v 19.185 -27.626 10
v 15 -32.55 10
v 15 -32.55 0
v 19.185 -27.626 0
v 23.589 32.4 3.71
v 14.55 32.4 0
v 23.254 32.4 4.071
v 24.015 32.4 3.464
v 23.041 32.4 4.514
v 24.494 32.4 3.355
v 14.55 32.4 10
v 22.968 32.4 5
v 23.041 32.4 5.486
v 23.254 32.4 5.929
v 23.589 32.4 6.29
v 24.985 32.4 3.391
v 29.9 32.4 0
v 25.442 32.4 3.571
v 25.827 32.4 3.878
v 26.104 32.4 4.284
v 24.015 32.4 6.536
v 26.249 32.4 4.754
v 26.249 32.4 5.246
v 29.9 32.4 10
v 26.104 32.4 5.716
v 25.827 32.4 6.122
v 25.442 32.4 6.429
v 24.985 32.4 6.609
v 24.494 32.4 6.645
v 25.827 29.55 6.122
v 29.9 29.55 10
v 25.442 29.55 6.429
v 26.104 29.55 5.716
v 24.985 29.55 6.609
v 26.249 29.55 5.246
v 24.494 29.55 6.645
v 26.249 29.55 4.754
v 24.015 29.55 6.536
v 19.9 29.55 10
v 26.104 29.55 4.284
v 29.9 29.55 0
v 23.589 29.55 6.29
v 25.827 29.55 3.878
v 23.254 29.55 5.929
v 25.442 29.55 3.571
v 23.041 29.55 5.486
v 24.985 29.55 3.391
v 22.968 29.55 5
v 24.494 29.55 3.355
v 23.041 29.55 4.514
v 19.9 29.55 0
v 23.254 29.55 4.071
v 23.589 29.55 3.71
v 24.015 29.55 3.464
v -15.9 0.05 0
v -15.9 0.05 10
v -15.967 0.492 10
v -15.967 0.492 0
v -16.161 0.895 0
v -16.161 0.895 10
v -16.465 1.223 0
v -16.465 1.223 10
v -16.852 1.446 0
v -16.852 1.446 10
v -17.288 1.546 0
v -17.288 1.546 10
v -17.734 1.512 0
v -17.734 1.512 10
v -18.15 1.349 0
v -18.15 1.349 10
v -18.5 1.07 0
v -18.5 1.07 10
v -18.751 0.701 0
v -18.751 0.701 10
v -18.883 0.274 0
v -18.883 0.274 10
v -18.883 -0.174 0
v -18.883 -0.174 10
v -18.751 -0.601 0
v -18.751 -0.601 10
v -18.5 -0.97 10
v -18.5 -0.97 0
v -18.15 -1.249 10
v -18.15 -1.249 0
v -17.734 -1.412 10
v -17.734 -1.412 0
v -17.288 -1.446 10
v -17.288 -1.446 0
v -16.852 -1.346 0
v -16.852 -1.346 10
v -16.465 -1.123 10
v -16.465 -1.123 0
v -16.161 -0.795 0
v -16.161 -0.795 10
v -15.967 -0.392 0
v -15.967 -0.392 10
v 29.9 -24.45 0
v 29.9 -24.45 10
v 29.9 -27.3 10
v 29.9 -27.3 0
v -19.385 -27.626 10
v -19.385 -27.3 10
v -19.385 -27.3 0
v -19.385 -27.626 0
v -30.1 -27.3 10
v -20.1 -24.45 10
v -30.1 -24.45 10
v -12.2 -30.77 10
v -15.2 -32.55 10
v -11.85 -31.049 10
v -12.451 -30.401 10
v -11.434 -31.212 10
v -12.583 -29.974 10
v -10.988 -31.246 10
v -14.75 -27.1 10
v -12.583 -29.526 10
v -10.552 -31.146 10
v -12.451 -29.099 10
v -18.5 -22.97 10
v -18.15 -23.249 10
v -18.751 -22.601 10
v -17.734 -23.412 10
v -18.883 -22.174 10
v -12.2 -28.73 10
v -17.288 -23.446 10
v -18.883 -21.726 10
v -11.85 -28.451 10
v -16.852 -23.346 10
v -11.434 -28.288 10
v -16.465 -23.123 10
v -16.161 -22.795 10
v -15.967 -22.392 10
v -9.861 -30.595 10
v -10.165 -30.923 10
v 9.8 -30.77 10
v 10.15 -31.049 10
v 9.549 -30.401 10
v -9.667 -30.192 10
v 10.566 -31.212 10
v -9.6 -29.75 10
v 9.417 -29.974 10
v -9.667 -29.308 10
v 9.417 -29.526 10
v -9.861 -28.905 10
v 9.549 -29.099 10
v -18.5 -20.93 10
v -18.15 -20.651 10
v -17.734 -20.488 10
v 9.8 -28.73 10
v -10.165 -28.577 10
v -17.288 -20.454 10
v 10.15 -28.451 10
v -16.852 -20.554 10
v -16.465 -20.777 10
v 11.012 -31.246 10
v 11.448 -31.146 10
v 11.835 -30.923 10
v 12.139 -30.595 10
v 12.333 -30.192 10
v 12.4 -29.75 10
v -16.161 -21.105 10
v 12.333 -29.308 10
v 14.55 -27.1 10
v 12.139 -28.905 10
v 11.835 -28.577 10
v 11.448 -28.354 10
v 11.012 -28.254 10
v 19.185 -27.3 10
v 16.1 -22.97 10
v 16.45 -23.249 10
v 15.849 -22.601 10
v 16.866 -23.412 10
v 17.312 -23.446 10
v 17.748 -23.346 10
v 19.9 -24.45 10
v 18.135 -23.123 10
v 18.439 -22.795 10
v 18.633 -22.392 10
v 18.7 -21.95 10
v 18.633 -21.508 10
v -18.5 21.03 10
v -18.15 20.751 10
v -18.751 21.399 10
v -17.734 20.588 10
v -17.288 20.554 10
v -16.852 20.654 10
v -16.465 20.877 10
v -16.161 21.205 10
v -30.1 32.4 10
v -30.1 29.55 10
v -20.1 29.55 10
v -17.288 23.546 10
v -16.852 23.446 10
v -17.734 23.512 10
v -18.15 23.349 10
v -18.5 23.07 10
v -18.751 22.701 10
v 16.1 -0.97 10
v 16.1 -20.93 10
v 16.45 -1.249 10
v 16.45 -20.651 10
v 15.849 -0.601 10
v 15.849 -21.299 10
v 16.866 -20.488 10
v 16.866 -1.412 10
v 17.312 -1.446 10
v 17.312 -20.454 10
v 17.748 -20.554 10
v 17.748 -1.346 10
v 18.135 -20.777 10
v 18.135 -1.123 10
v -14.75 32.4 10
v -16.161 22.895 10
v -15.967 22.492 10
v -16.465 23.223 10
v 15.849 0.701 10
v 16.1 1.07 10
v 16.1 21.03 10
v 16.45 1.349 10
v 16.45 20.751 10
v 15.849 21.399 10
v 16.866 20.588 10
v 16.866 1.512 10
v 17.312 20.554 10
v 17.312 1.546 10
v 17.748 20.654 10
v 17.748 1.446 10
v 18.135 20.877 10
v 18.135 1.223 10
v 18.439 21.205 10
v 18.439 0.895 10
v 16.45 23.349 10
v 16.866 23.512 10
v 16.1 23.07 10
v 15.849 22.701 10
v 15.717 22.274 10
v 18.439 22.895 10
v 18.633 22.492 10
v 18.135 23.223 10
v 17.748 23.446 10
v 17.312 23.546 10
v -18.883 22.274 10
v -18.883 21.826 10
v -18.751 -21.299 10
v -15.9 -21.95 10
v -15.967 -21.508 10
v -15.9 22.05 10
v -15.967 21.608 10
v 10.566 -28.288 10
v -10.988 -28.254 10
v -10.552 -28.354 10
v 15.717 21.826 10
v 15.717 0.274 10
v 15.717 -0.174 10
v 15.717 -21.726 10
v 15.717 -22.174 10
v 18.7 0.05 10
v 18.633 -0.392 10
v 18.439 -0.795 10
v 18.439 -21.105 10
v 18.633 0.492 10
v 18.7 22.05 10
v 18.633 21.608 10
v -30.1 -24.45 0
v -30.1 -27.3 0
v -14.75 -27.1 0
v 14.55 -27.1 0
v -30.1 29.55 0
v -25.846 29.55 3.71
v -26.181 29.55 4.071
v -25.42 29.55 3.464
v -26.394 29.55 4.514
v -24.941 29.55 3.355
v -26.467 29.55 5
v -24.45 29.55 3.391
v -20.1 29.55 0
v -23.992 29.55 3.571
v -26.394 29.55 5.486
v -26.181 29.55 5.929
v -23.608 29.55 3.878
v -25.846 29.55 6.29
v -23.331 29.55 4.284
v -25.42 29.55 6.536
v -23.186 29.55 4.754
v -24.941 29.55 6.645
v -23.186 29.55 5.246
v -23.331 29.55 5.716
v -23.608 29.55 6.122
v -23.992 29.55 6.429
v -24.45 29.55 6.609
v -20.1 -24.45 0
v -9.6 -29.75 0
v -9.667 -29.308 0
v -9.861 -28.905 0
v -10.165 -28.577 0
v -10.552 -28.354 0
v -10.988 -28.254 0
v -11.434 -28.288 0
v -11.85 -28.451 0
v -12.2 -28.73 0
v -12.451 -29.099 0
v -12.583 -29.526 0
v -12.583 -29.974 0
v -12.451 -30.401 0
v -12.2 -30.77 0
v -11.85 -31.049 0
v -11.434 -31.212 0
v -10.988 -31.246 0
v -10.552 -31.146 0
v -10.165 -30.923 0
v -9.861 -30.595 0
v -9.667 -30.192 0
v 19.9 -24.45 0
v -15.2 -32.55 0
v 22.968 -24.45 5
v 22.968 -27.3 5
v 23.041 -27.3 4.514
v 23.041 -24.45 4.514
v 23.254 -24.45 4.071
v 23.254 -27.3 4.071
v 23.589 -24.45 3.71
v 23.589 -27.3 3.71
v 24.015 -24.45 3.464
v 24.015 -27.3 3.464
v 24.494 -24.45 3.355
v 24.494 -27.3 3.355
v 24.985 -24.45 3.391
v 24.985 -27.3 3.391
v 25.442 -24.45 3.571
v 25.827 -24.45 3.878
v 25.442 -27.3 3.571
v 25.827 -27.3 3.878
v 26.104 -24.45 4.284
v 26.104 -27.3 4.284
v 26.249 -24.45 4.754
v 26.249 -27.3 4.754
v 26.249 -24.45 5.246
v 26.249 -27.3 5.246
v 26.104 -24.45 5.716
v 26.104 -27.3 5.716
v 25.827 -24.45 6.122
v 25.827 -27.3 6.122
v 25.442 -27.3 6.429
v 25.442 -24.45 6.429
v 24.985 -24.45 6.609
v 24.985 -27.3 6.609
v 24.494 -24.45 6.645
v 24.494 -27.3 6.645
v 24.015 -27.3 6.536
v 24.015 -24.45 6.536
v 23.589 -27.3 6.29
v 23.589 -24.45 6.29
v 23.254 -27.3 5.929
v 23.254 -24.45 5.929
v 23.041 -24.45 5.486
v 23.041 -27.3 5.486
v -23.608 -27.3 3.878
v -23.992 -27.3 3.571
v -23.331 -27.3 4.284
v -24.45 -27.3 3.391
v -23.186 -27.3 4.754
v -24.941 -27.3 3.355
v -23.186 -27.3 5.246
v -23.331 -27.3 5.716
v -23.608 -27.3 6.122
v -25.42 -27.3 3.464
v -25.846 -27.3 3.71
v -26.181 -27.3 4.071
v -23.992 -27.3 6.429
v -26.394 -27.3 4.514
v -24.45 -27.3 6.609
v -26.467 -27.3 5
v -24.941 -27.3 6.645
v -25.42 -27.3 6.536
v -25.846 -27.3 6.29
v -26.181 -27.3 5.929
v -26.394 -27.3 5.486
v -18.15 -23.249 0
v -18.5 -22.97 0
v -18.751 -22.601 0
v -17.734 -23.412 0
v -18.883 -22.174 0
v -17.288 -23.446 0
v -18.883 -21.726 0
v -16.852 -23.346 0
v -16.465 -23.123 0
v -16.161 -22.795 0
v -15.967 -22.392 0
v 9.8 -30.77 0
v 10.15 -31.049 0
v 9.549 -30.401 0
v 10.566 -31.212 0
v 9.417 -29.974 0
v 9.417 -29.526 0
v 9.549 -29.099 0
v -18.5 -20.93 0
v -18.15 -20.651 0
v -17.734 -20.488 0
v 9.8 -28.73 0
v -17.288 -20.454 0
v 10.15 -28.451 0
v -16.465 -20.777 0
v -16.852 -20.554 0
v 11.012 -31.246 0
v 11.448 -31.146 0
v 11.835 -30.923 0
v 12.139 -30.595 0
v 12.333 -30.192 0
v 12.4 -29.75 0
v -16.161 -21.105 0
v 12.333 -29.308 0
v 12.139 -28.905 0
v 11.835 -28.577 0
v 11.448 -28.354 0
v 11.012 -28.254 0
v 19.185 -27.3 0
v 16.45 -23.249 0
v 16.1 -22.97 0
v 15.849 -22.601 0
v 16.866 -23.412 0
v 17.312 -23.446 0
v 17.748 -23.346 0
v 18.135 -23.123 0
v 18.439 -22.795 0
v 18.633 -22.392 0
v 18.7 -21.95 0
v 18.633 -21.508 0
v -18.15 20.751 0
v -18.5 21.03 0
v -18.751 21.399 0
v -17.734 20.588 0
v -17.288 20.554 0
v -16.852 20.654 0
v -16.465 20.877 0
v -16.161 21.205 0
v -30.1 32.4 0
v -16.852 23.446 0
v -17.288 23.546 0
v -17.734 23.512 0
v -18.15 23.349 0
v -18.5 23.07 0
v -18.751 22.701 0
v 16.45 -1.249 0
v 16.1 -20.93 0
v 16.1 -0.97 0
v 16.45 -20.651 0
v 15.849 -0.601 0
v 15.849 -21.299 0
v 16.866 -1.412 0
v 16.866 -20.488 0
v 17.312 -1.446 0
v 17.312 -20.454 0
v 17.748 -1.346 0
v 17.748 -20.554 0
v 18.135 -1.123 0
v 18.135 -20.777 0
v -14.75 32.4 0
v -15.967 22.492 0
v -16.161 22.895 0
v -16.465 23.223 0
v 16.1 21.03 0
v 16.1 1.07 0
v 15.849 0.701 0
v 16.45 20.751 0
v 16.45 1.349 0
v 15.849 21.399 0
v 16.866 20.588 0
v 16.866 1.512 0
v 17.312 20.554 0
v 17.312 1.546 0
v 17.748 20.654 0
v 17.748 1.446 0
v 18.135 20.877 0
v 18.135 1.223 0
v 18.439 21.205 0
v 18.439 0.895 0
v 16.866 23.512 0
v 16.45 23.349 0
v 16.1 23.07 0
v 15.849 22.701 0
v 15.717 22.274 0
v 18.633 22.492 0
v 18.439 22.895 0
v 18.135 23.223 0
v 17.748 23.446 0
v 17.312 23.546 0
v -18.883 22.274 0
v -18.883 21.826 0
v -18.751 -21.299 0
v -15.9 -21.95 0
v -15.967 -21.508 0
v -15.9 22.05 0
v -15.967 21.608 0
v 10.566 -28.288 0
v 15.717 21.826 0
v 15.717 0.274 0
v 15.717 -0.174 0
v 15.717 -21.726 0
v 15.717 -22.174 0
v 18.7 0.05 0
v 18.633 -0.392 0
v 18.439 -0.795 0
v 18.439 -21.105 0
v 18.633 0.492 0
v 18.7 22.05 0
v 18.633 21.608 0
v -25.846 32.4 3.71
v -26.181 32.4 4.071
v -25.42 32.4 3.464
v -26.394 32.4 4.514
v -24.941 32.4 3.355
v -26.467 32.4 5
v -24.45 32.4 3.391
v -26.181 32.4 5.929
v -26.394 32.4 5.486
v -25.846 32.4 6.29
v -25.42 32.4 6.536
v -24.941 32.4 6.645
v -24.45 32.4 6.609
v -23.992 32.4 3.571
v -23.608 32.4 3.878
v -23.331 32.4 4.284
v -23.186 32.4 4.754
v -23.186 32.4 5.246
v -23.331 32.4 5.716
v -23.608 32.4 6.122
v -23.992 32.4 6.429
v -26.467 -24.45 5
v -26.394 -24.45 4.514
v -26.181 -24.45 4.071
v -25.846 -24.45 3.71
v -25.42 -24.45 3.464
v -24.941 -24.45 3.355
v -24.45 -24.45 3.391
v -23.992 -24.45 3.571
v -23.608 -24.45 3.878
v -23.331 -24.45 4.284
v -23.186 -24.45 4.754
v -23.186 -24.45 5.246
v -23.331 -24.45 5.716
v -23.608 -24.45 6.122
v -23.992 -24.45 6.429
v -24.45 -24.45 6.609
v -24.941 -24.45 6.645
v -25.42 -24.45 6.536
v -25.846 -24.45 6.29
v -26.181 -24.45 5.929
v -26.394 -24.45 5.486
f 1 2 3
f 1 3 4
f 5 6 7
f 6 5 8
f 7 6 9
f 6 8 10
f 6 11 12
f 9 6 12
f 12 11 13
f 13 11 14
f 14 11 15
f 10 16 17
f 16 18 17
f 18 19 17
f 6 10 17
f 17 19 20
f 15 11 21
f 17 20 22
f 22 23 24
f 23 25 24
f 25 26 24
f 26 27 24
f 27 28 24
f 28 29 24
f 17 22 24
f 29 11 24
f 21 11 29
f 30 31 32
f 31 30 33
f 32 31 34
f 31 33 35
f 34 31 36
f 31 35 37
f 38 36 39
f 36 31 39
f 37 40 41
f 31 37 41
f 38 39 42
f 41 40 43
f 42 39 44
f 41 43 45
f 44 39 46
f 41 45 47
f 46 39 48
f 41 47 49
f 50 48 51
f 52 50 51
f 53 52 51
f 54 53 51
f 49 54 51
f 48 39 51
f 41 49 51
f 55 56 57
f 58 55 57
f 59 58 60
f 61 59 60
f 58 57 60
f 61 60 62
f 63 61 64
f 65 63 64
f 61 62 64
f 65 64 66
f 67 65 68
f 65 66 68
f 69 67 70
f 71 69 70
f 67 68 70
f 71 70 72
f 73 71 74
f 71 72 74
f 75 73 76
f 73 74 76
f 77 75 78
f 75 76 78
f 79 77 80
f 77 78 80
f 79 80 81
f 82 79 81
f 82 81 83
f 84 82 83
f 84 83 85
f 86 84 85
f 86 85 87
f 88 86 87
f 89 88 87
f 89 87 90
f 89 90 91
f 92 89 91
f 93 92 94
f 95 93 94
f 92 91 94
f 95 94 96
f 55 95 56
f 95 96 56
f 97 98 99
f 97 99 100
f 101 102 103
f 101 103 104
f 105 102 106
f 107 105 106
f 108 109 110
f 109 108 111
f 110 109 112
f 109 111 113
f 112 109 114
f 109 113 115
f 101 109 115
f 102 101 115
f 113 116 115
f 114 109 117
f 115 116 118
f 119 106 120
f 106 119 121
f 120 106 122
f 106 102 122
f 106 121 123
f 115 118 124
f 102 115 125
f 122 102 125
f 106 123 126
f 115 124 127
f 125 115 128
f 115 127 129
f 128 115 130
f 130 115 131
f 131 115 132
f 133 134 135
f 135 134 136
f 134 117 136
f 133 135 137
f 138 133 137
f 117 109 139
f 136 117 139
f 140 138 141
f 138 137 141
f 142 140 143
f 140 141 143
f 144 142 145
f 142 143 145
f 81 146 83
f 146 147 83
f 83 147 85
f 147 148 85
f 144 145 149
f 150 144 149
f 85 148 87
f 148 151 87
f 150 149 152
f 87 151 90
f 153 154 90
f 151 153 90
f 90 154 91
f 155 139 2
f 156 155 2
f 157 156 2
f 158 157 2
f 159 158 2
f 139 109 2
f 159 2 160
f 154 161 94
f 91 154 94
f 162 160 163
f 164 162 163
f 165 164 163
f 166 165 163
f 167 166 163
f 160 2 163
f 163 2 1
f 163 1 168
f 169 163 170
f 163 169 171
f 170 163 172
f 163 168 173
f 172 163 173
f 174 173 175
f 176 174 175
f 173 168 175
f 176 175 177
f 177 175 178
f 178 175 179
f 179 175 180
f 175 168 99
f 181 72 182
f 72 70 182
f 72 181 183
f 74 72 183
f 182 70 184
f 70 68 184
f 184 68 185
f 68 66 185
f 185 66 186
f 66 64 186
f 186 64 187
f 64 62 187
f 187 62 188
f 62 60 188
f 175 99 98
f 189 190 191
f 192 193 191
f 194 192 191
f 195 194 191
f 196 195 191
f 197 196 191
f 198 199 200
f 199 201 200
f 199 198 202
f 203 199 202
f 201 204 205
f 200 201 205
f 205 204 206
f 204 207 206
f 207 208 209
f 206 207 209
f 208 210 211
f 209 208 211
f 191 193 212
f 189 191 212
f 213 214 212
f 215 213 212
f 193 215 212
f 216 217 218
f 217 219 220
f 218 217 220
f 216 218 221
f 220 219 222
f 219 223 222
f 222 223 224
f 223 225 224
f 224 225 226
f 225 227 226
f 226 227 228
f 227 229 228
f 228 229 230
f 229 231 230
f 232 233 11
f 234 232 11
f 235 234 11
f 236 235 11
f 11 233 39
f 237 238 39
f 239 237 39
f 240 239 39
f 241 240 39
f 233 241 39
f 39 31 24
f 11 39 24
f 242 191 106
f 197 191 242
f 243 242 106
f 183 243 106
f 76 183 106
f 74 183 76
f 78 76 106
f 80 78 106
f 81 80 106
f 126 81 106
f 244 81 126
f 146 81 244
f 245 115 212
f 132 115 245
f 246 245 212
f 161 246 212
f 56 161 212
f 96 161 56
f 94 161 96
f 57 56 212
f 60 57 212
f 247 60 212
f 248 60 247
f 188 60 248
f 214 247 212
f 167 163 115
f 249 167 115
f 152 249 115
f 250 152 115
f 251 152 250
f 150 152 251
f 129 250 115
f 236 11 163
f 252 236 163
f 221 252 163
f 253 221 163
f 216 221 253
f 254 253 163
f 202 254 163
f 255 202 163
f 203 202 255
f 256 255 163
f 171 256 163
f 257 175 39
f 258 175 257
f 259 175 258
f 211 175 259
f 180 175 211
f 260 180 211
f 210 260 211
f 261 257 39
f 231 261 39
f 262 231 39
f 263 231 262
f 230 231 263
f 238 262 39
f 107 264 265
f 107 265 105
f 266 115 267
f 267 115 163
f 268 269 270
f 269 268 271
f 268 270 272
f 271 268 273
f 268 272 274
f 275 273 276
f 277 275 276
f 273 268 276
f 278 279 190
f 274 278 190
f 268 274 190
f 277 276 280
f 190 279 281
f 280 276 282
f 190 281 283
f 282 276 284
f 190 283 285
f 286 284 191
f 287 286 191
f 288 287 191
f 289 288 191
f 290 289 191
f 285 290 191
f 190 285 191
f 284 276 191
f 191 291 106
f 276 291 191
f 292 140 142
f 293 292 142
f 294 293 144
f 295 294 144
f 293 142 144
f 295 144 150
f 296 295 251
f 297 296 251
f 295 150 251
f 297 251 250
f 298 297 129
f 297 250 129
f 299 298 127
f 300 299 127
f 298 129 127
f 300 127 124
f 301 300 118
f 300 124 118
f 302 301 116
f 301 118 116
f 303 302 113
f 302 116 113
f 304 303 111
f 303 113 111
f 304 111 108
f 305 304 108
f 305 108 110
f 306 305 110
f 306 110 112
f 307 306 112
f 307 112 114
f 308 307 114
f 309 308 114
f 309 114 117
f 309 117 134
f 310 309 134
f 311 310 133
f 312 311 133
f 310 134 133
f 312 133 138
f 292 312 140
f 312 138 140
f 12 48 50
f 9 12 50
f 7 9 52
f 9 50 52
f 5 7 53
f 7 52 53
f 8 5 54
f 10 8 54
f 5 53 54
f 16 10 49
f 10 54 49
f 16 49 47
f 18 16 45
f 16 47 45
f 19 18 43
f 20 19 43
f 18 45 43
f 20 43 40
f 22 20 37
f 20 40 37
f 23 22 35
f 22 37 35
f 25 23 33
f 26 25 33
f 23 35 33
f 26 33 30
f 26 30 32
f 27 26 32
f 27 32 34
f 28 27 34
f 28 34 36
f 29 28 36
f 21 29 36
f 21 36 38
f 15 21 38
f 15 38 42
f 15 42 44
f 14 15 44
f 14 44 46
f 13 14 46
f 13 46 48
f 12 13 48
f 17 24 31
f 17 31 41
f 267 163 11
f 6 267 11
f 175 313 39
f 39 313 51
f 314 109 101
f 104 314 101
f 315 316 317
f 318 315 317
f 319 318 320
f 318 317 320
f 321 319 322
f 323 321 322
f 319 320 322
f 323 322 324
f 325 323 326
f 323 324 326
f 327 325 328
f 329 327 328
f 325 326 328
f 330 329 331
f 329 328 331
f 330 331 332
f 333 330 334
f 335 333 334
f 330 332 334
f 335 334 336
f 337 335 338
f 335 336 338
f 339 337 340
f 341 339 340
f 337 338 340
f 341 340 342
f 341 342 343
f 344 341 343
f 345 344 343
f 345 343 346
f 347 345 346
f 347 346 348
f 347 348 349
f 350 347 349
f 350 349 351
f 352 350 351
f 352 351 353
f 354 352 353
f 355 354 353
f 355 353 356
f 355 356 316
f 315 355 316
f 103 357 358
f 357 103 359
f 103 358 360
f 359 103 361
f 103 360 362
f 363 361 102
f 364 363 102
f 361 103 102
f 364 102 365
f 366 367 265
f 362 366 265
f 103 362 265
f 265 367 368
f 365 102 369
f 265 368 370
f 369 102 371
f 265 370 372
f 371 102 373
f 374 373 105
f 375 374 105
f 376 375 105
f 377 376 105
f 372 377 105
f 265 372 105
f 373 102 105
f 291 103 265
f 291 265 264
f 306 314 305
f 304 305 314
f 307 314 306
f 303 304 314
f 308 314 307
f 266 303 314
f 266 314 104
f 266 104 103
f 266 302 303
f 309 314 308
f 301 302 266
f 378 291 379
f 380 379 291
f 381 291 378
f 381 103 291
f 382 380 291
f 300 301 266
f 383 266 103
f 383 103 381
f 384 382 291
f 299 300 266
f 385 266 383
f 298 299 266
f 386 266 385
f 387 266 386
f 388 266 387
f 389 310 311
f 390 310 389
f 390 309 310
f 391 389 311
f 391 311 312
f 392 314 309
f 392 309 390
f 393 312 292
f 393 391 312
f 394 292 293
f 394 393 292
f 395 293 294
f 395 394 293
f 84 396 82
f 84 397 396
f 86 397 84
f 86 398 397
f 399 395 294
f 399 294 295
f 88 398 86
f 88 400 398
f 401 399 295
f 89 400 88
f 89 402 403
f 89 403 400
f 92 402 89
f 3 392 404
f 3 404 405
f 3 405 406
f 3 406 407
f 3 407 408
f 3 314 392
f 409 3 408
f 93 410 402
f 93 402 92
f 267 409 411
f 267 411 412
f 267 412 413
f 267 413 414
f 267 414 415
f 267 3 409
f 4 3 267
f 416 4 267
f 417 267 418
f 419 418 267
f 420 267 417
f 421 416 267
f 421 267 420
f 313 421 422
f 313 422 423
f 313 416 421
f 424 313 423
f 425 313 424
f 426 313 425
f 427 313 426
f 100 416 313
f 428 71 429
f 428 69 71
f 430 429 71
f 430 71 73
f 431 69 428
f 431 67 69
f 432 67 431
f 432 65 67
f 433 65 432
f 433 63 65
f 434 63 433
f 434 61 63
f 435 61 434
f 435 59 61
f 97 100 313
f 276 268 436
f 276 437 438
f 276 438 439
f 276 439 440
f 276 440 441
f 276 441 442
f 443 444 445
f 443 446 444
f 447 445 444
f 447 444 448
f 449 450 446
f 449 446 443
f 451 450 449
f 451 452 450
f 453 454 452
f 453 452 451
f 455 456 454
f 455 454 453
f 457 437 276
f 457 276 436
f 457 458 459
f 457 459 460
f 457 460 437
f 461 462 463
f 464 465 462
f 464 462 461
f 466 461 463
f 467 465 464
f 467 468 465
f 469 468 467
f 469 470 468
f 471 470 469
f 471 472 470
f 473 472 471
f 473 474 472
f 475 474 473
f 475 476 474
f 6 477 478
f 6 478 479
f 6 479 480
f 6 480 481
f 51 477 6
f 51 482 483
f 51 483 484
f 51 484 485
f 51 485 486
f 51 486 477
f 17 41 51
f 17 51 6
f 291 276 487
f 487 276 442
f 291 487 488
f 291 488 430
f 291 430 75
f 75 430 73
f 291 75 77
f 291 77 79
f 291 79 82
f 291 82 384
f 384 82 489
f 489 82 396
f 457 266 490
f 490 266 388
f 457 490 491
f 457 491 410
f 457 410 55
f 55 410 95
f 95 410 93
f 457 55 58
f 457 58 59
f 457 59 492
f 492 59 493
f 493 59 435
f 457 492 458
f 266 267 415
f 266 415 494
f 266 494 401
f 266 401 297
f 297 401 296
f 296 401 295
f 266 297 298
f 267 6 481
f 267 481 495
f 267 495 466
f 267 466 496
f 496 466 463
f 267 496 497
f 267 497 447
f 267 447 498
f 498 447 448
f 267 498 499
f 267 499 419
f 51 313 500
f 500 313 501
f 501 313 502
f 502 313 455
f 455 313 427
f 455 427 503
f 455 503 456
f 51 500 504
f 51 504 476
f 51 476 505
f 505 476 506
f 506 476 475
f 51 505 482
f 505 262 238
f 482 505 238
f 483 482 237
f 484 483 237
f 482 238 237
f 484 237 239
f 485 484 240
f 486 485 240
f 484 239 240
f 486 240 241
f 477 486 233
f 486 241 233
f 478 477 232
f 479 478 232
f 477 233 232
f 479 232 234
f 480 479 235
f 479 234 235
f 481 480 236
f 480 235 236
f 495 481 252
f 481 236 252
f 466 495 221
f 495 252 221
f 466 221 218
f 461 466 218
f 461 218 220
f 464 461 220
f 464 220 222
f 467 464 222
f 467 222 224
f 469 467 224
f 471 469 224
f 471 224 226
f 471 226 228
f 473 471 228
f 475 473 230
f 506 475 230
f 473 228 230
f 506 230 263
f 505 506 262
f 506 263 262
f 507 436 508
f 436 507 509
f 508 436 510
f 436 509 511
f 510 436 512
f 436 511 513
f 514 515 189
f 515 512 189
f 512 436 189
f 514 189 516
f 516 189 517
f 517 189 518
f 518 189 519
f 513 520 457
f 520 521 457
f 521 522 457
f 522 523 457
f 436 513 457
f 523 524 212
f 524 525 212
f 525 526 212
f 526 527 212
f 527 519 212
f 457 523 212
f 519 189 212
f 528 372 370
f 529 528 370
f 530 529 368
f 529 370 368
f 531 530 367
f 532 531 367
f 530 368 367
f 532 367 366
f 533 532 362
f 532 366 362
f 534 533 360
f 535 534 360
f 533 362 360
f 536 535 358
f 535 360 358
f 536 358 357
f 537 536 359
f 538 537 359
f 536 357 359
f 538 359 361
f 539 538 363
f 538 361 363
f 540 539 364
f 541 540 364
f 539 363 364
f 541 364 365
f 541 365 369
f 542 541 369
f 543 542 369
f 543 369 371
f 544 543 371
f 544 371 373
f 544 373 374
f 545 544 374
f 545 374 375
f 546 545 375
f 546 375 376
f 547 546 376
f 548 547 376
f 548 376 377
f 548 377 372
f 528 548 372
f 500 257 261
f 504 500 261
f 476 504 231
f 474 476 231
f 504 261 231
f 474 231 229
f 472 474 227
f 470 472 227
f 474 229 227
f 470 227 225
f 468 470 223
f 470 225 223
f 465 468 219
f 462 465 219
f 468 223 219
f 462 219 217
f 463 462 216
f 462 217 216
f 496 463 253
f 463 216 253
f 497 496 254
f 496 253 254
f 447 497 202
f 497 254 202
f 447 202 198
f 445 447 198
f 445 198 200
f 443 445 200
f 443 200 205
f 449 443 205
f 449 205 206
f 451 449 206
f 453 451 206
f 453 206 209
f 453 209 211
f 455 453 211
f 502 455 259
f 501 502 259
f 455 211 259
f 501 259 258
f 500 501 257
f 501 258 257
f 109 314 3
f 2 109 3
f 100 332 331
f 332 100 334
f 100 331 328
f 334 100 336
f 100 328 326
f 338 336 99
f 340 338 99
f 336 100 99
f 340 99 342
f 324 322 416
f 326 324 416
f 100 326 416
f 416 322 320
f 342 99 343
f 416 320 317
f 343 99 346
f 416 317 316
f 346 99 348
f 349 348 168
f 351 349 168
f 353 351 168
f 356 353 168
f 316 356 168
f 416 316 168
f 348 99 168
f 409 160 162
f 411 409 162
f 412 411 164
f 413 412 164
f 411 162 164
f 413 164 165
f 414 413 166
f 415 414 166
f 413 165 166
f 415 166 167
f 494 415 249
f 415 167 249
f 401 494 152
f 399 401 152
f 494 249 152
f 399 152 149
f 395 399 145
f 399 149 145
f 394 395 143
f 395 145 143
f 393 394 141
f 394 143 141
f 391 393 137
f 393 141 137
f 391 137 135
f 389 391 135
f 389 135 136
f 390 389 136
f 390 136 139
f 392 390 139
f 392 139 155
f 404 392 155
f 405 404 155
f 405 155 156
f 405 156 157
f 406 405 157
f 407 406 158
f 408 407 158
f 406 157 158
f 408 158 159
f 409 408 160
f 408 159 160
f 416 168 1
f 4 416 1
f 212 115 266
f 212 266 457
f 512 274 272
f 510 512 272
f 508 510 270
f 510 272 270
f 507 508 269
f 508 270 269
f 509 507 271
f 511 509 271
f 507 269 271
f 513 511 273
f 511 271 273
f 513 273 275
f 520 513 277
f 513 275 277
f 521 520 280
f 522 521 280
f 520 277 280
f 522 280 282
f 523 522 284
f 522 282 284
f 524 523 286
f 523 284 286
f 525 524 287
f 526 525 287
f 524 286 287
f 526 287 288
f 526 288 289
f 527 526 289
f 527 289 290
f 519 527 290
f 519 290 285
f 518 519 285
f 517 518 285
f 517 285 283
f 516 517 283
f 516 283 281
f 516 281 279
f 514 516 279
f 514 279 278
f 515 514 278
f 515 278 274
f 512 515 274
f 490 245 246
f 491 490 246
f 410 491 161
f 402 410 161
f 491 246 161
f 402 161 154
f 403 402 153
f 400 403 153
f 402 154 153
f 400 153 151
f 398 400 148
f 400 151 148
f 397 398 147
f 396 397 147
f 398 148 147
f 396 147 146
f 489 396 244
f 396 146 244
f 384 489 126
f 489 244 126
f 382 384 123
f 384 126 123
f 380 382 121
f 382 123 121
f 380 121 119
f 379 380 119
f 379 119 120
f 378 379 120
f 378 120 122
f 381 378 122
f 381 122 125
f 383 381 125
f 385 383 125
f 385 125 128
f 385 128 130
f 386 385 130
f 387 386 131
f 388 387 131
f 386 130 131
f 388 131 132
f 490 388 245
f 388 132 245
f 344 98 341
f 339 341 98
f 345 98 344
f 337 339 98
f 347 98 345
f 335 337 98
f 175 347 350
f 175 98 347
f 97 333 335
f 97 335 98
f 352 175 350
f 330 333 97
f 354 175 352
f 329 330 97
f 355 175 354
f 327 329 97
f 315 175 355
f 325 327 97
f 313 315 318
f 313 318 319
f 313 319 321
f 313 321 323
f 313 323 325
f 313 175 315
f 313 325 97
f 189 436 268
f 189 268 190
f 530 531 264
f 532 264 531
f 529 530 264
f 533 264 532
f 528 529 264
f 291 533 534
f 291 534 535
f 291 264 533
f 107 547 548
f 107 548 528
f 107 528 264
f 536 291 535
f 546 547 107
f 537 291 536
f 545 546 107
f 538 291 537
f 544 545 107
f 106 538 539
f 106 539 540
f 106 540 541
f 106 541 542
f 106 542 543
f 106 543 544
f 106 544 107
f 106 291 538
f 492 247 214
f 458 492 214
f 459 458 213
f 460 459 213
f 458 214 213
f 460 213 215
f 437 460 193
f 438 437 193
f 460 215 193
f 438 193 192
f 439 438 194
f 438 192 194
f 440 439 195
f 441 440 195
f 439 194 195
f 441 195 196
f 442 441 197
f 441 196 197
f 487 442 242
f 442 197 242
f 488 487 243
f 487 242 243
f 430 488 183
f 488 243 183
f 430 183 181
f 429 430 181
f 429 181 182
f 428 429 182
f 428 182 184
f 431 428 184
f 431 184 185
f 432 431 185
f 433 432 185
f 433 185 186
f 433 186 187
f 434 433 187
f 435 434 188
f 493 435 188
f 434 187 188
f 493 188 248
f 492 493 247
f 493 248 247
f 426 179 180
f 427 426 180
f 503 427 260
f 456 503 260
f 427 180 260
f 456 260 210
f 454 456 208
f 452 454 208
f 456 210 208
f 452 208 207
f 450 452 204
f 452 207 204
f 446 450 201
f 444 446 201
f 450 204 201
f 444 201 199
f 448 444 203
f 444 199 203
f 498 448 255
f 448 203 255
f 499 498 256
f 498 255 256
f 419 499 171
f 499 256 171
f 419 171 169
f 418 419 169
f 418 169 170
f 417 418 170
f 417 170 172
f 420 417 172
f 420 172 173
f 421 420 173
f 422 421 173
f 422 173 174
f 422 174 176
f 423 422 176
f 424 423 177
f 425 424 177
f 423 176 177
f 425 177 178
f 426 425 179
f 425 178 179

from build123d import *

# Parameters (mm, degrees)
SKETCH1_W               = 40
SKETCH1_H               = 65.1
BOSS_EXTRUDE1_DEPTH     = 10
CUT_EXTRUDE1_DEPTH      = 10
SKETCH4_W               = 29.3
SKETCH4_H               = 59.5
CUT_EXTRUDE2_DEPTH      = 10
SKETCH5_R               = 1.5
CUT_EXTRUDE3_DEPTH      = 10
SKETCH7_W               = 10
SKETCH7_H               = 3
BOSS_EXTRUDE2_DEPTH     = 10
SKETCH8_W               = 10
SKETCH8_H               = 3
BOSS_EXTRUDE3_DEPTH     = 10
SKETCH9_R               = 1.65
CUT_EXTRUDE4_DEPTH      = 61
SKETCH10_R              = 1.65
CUT_EXTRUDE5_DEPTH      = 61
ESQUISSE1_W             = 15.35
ESQUISSE1_H             = 0.15
ESQUISSE1_W_2           = 29.3
ENL_V_MAT_EXTRU_1_DEPTH = 11


with BuildPart() as part:
    # Sketch1 → Boss-Extrude1 (new body)
    with BuildSketch(Plane.XY):
        with Locations((-0.1, 0)):
            Rectangle(SKETCH1_W, SKETCH1_H)
    extrude(amount=BOSS_EXTRUDE1_DEPTH)

    # Sketch2 → Cut-Extrude1 (cut)
    with BuildSketch(Plane.XY.offset(10)):
        Polygon((15, -32.55), (19.335, -27.45), (19.9, -27.45), (19.9, -32.55), align=None)
        Polygon((-20.1, -27.45), (-20.1, -32.55), (-15.2, -32.55), (-19.535, -27.45), align=None)
    extrude(amount=-CUT_EXTRUDE1_DEPTH, mode=Mode.SUBTRACT)

    # Sketch4 → Cut-Extrude2 (cut)
    with BuildSketch(Plane.XY.offset(10)):
        with Locations((-0.1, 2.8)):
            Rectangle(SKETCH4_W, SKETCH4_H)
    extrude(amount=-CUT_EXTRUDE2_DEPTH, mode=Mode.SUBTRACT)

    # Sketch5 → Cut-Extrude3 (cut)
    with BuildSketch(Plane.XY.offset(10)):
        with Locations((-17.4, 22.05)):
            Circle(SKETCH5_R)
        with Locations((-17.4, 0.05)):
            Circle(SKETCH5_R)
        with Locations((-17.4, -21.95)):
            Circle(SKETCH5_R)
        with Locations((-11.1, -29.75)):
            Circle(SKETCH5_R)
        with Locations((10.9, -29.75)):
            Circle(SKETCH5_R)
        with Locations((17.2, -21.95)):
            Circle(SKETCH5_R)
        with Locations((17.2, 0.05)):
            Circle(SKETCH5_R)
        with Locations((17.2, 22.05)):
            Circle(SKETCH5_R)
    extrude(amount=-CUT_EXTRUDE3_DEPTH, mode=Mode.SUBTRACT)

    # Sketch7 → Boss-Extrude2 (add)
    with BuildSketch(Plane(origin=(19.9, 0, 0), x_dir=(0, 0, -1), z_dir=(1, 0, 0))):
        with Locations((-5, 31.05)):
            Rectangle(SKETCH7_W, SKETCH7_H)
        with Locations((-5, -25.95)):
            Rectangle(SKETCH7_W, SKETCH7_H)
    extrude(amount=BOSS_EXTRUDE2_DEPTH)

    # Sketch8 → Boss-Extrude3 (add)
    with BuildSketch(Plane.ZY.offset(20.1)):
        with Locations((5, 31.05)):
            Rectangle(SKETCH8_W, SKETCH8_H)
        with Locations((5, -25.95)):
            Rectangle(SKETCH8_W, SKETCH8_H)
    extrude(amount=BOSS_EXTRUDE3_DEPTH)

    # Sketch9 → Cut-Extrude4 (cut, through all)
    with BuildSketch(Plane(origin=(0, -27.45, 0), x_dir=(-1, 0, 0), z_dir=(0, -1, 0))):
        with Locations((24.8175, -5)):
            Circle(SKETCH9_R)
    extrude(amount=-CUT_EXTRUDE4_DEPTH, mode=Mode.SUBTRACT)

    # Sketch10 → Cut-Extrude5 (cut, through all)
    with BuildSketch(Plane(origin=(0, -27.45, 0), x_dir=(-1, 0, 0), z_dir=(0, -1, 0))):
        with Locations((-24.6175, -5)):
            Circle(SKETCH10_R)
    extrude(amount=-CUT_EXTRUDE5_DEPTH, mode=Mode.SUBTRACT)

    # Esquisse1 → Enlèv. mat.-Extru.1 (cut, through all)
    with BuildSketch(Plane.XY.offset(10)):
        Polygon((29.9, -27.45), (29.9, -27.3), (19.335, -27.3), (19.185, -27.3), (19.185, -27.905597112), (27.185, -27.905597112), (27.185, -27.45), align=None)
        with Locations((22.225, 32.475)):
            Rectangle(ESQUISSE1_W, ESQUISSE1_H)
        Polygon((-27.385, -27.905597112), (-27.385, -27.45), (-30.1, -27.45), (-30.1, -27.3), (-19.535, -27.3), (-19.385, -27.3), (-19.385, -27.905597112), align=None)
        with Locations((-22.425, 32.475)):
            Rectangle(ESQUISSE1_W, ESQUISSE1_H)
        with Locations((-0.1, -27.025)):
            Rectangle(ESQUISSE1_W_2, ESQUISSE1_H)
    extrude(amount=-ENL_V_MAT_EXTRU_1_DEPTH, mode=Mode.SUBTRACT)


solid = part.part
